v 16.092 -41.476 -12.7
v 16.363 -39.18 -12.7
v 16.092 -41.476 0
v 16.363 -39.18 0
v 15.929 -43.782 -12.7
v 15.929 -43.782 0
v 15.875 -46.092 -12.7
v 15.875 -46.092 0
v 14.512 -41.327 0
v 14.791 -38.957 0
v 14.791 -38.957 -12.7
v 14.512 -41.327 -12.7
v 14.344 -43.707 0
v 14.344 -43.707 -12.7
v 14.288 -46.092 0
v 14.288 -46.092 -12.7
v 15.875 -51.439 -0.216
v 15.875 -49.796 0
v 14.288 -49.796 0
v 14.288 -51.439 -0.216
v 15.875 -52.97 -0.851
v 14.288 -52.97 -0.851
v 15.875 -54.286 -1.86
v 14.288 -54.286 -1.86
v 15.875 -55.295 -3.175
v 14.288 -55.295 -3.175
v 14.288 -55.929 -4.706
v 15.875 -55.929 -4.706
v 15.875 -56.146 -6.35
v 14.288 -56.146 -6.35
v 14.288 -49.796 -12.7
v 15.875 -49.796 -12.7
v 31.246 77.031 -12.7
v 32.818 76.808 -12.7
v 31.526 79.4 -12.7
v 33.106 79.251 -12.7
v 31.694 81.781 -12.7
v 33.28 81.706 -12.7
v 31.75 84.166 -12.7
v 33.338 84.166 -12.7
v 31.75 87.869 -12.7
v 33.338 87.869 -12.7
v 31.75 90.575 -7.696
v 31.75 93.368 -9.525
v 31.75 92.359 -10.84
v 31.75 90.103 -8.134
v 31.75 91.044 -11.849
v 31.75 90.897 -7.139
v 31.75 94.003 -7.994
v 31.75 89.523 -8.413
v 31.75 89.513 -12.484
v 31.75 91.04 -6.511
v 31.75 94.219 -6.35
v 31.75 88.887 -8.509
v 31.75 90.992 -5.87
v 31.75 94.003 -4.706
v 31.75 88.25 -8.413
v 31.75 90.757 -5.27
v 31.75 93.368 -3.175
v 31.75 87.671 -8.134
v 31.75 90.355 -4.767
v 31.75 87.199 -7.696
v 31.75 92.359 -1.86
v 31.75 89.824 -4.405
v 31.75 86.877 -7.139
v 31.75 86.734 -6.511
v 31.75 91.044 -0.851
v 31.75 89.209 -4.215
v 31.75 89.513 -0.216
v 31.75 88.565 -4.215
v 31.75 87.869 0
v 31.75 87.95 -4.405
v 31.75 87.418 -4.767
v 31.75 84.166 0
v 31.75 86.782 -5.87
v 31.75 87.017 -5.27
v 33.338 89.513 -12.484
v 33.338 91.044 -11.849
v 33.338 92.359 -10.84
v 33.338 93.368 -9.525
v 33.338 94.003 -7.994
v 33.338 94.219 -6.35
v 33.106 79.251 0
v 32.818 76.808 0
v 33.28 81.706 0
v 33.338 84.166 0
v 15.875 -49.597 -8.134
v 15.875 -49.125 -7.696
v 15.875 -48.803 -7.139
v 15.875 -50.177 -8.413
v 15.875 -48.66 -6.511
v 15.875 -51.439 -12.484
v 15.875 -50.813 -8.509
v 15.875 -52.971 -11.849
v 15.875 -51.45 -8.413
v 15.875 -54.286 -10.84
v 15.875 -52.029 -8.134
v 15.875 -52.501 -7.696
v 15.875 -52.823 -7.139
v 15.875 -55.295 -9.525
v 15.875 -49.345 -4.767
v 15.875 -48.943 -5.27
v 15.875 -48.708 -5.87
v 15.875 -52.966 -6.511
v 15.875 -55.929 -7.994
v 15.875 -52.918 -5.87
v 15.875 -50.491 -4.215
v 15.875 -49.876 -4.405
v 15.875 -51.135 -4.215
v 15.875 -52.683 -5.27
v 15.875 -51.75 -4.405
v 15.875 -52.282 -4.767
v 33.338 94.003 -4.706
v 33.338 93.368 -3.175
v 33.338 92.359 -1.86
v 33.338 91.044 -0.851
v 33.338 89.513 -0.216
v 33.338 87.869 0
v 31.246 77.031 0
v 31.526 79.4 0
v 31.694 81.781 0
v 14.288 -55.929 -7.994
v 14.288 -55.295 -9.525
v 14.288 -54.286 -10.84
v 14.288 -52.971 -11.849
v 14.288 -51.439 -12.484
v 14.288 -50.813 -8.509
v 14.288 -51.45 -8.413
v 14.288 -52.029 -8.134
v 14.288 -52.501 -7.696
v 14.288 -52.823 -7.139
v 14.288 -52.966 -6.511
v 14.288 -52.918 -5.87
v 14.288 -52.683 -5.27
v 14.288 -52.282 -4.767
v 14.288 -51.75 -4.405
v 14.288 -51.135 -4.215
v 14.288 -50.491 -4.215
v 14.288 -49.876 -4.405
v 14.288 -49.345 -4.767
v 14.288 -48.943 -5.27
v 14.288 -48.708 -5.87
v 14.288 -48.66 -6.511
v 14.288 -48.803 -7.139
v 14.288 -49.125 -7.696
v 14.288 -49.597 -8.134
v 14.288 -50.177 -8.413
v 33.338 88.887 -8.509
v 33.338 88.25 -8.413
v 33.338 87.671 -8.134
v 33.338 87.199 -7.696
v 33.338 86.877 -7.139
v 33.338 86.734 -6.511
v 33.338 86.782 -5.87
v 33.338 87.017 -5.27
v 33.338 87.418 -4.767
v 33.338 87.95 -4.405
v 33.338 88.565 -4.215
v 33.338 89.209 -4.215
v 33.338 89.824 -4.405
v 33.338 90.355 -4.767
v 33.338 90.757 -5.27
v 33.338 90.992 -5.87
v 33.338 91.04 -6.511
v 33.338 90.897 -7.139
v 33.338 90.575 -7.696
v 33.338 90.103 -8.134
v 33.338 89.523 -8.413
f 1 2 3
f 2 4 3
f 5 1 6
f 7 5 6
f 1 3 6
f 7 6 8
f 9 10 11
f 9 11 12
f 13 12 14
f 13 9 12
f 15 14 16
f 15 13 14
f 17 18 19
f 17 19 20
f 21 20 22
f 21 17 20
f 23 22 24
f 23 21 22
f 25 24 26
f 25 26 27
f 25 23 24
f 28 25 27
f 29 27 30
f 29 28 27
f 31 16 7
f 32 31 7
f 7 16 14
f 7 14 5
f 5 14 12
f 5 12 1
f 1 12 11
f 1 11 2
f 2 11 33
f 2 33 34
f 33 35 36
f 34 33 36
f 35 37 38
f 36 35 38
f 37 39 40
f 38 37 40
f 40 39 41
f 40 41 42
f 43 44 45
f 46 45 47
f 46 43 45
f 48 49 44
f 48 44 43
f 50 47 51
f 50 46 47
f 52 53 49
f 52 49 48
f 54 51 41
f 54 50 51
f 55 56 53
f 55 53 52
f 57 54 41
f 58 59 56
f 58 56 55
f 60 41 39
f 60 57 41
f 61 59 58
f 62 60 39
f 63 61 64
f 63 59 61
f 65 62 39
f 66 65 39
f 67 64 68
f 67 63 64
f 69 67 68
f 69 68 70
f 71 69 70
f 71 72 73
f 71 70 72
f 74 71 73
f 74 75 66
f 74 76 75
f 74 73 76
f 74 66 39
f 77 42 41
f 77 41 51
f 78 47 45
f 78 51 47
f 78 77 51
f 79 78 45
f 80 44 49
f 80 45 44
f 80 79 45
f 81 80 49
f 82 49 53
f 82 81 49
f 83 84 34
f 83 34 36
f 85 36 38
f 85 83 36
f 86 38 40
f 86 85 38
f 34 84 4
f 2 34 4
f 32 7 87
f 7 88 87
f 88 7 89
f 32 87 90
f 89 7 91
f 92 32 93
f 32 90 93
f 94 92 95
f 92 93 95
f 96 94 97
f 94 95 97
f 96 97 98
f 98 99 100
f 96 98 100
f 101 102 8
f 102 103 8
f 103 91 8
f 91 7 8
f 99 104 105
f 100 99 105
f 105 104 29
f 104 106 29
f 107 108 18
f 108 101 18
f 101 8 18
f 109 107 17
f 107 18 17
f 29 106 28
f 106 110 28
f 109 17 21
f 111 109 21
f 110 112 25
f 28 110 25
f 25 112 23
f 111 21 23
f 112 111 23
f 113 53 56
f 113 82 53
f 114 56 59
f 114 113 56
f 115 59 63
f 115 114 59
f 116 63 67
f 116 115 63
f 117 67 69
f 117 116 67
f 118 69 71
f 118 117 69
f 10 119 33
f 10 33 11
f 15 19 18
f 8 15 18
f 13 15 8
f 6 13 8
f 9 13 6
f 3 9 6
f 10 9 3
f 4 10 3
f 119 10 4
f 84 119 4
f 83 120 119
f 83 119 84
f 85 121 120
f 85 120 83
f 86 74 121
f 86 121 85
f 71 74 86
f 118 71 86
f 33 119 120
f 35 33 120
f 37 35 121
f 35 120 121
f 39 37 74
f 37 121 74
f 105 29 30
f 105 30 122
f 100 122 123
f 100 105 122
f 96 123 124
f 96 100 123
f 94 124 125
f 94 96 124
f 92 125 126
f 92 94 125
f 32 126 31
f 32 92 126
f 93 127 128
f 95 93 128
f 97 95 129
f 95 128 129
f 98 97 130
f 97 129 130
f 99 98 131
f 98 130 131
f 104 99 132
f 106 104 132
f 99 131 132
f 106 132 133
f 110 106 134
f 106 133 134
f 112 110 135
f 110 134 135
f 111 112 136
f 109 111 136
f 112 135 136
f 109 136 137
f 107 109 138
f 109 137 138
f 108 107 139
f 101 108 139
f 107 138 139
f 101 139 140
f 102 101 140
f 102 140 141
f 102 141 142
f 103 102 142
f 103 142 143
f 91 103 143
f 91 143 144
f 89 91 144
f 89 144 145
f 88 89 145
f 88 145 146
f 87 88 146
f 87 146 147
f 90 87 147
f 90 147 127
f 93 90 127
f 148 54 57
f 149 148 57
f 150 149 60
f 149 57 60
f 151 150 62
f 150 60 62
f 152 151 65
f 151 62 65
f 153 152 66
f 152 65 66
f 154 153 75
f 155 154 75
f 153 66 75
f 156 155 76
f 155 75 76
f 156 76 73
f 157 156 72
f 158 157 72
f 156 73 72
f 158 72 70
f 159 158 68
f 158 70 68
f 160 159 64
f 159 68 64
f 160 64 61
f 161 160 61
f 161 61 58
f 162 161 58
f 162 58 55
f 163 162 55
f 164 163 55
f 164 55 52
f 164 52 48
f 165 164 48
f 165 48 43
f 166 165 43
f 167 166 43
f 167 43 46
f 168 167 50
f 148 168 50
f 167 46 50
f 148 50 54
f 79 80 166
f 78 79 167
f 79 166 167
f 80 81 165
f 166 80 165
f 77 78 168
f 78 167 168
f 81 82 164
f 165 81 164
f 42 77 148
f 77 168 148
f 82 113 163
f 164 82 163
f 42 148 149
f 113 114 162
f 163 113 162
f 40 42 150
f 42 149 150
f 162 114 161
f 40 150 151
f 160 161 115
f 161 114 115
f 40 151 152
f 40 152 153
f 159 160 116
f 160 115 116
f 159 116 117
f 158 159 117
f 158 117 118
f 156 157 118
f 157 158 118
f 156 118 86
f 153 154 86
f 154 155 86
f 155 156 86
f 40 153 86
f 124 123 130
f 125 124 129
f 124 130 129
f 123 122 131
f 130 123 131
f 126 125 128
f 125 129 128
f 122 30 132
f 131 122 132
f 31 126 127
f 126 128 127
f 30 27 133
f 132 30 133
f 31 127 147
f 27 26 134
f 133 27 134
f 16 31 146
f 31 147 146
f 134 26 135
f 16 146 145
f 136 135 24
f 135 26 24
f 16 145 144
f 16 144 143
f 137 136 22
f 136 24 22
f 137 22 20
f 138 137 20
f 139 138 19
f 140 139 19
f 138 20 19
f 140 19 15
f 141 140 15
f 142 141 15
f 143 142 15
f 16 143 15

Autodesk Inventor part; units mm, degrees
ref_plane "YZ Plane" through (0, 0, 0) normal (1, 0, 0) x (0, 1, 0)
ref_plane "XZ Plane" through (0, 0, 0) normal (0, 1, 0) x (-1, 0, 0)
ref_plane "XY Plane" through (0, 0, 0) normal (0, 0, 1) x (1, 0, 0)
sketch "Sketch1" plane through (0, 0, 0) normal (0, 0, 1) x (1, 0, 0)
  line L0 (31.75, 85.8647) -> (31.75, 91.9353) construction
  line L1 (14.2875, -48.6156) -> (14.2875, -52.9844) construction
  line L2 (31.75, 94.2191) -> (31.75, 84.1662)
  line L3 (14.2875, -56.1455) -> (14.2875, -46.0925)
  line L4 (31.2464, 77.0306) -> (14.7911, -38.957)
  arc A0 (31.2464, 77.0306) -> (31.75, 84.1662) centre (-19.05, 84.1662) ccw
  arc A1 (14.7911, -38.957) -> (14.2875, -46.0925) centre (65.0875, -46.0925) ccw
  line L5 (33.3375, 94.2191) -> (33.3375, 84.1662)
  arc A2 (32.8181, 76.8076) -> (33.3375, 84.1662) centre (-19.05, 84.1662) ccw
  line L6 (32.8181, 76.8076) -> (16.3629, -39.1799)
  arc A3 (16.3629, -39.1799) -> (15.875, -46.0925) centre (65.0875, -46.0925) ccw
  line L7 (15.875, -46.0925) -> (15.875, -56.1455)
  line L8 (31.75, 94.2191) -> (33.3375, 94.2191)
  line L9 (14.2875, -56.1455) -> (15.875, -56.1455)
  line L10 (43.5527, 91.6185) -> (43.5527, 89.0199)
  point P0 (0, 0)
  dimension "d0" = 50.8
  dimension "d1" = 50.8
  dimension "d2" = 1.5875
  dimension "d26" = 2.5986
  dimension "d27" = 130.2587
  dimension "d28" = 10.053
extrude "Extrusion1" add sketch "Sketch1" against normal blind 12.7
fillet "Fillet1" radius 6.35 1 edges at (32.5437, 94.2191, 0)
fillet "Fillet2" radius 6.35 1 edges at (32.5437, 94.2191, -12.7)
fillet "Fillet3" radius 6.35 1 edges at (15.0812, -56.1455, 0)
fillet "Fillet4" radius 6.35 1 edges at (15.0812, -56.1455, -12.7)
sketch "Sketch2" plane through (33.3375, 84.1662, 0) normal (1, 0, 0) x (0, 0, -1)
  line L0 (12.7, 10.053) -> (12.7, 0) construction
  line L1 (0, 0) -> (0, 10.053) construction
  line L2 (0, 0) -> (12.7, 0) construction
  circle A0 centre (6.35, 4.7207) radius 6.35
  point P0 (0, -84.1662)
hole "Hole1" at (33.3375, 88.8868, -6.35) direction (-1, 0, 0) diameter 4.318 end through all
sketch "Sketch3" plane through (15.875, -56.1455, 0) normal (1, 0, 0) x (0, 0, -1)
  line L0 (12.7, 10.053) -> (12.7, 0) construction
  line L1 (0, 0) -> (0, 10.053) construction
  circle A0 centre (6.35, 5.3323) radius 6.35
  line L2 (0, 10.053) -> (12.7, 10.053) construction
  point P0 (0, 56.1455)
hole "Hole2" at (15.875, -50.8132, -6.35) direction (-1, 0, 0) diameter 4.318 end through all
properties part number "Endgame ramp polycarb"
